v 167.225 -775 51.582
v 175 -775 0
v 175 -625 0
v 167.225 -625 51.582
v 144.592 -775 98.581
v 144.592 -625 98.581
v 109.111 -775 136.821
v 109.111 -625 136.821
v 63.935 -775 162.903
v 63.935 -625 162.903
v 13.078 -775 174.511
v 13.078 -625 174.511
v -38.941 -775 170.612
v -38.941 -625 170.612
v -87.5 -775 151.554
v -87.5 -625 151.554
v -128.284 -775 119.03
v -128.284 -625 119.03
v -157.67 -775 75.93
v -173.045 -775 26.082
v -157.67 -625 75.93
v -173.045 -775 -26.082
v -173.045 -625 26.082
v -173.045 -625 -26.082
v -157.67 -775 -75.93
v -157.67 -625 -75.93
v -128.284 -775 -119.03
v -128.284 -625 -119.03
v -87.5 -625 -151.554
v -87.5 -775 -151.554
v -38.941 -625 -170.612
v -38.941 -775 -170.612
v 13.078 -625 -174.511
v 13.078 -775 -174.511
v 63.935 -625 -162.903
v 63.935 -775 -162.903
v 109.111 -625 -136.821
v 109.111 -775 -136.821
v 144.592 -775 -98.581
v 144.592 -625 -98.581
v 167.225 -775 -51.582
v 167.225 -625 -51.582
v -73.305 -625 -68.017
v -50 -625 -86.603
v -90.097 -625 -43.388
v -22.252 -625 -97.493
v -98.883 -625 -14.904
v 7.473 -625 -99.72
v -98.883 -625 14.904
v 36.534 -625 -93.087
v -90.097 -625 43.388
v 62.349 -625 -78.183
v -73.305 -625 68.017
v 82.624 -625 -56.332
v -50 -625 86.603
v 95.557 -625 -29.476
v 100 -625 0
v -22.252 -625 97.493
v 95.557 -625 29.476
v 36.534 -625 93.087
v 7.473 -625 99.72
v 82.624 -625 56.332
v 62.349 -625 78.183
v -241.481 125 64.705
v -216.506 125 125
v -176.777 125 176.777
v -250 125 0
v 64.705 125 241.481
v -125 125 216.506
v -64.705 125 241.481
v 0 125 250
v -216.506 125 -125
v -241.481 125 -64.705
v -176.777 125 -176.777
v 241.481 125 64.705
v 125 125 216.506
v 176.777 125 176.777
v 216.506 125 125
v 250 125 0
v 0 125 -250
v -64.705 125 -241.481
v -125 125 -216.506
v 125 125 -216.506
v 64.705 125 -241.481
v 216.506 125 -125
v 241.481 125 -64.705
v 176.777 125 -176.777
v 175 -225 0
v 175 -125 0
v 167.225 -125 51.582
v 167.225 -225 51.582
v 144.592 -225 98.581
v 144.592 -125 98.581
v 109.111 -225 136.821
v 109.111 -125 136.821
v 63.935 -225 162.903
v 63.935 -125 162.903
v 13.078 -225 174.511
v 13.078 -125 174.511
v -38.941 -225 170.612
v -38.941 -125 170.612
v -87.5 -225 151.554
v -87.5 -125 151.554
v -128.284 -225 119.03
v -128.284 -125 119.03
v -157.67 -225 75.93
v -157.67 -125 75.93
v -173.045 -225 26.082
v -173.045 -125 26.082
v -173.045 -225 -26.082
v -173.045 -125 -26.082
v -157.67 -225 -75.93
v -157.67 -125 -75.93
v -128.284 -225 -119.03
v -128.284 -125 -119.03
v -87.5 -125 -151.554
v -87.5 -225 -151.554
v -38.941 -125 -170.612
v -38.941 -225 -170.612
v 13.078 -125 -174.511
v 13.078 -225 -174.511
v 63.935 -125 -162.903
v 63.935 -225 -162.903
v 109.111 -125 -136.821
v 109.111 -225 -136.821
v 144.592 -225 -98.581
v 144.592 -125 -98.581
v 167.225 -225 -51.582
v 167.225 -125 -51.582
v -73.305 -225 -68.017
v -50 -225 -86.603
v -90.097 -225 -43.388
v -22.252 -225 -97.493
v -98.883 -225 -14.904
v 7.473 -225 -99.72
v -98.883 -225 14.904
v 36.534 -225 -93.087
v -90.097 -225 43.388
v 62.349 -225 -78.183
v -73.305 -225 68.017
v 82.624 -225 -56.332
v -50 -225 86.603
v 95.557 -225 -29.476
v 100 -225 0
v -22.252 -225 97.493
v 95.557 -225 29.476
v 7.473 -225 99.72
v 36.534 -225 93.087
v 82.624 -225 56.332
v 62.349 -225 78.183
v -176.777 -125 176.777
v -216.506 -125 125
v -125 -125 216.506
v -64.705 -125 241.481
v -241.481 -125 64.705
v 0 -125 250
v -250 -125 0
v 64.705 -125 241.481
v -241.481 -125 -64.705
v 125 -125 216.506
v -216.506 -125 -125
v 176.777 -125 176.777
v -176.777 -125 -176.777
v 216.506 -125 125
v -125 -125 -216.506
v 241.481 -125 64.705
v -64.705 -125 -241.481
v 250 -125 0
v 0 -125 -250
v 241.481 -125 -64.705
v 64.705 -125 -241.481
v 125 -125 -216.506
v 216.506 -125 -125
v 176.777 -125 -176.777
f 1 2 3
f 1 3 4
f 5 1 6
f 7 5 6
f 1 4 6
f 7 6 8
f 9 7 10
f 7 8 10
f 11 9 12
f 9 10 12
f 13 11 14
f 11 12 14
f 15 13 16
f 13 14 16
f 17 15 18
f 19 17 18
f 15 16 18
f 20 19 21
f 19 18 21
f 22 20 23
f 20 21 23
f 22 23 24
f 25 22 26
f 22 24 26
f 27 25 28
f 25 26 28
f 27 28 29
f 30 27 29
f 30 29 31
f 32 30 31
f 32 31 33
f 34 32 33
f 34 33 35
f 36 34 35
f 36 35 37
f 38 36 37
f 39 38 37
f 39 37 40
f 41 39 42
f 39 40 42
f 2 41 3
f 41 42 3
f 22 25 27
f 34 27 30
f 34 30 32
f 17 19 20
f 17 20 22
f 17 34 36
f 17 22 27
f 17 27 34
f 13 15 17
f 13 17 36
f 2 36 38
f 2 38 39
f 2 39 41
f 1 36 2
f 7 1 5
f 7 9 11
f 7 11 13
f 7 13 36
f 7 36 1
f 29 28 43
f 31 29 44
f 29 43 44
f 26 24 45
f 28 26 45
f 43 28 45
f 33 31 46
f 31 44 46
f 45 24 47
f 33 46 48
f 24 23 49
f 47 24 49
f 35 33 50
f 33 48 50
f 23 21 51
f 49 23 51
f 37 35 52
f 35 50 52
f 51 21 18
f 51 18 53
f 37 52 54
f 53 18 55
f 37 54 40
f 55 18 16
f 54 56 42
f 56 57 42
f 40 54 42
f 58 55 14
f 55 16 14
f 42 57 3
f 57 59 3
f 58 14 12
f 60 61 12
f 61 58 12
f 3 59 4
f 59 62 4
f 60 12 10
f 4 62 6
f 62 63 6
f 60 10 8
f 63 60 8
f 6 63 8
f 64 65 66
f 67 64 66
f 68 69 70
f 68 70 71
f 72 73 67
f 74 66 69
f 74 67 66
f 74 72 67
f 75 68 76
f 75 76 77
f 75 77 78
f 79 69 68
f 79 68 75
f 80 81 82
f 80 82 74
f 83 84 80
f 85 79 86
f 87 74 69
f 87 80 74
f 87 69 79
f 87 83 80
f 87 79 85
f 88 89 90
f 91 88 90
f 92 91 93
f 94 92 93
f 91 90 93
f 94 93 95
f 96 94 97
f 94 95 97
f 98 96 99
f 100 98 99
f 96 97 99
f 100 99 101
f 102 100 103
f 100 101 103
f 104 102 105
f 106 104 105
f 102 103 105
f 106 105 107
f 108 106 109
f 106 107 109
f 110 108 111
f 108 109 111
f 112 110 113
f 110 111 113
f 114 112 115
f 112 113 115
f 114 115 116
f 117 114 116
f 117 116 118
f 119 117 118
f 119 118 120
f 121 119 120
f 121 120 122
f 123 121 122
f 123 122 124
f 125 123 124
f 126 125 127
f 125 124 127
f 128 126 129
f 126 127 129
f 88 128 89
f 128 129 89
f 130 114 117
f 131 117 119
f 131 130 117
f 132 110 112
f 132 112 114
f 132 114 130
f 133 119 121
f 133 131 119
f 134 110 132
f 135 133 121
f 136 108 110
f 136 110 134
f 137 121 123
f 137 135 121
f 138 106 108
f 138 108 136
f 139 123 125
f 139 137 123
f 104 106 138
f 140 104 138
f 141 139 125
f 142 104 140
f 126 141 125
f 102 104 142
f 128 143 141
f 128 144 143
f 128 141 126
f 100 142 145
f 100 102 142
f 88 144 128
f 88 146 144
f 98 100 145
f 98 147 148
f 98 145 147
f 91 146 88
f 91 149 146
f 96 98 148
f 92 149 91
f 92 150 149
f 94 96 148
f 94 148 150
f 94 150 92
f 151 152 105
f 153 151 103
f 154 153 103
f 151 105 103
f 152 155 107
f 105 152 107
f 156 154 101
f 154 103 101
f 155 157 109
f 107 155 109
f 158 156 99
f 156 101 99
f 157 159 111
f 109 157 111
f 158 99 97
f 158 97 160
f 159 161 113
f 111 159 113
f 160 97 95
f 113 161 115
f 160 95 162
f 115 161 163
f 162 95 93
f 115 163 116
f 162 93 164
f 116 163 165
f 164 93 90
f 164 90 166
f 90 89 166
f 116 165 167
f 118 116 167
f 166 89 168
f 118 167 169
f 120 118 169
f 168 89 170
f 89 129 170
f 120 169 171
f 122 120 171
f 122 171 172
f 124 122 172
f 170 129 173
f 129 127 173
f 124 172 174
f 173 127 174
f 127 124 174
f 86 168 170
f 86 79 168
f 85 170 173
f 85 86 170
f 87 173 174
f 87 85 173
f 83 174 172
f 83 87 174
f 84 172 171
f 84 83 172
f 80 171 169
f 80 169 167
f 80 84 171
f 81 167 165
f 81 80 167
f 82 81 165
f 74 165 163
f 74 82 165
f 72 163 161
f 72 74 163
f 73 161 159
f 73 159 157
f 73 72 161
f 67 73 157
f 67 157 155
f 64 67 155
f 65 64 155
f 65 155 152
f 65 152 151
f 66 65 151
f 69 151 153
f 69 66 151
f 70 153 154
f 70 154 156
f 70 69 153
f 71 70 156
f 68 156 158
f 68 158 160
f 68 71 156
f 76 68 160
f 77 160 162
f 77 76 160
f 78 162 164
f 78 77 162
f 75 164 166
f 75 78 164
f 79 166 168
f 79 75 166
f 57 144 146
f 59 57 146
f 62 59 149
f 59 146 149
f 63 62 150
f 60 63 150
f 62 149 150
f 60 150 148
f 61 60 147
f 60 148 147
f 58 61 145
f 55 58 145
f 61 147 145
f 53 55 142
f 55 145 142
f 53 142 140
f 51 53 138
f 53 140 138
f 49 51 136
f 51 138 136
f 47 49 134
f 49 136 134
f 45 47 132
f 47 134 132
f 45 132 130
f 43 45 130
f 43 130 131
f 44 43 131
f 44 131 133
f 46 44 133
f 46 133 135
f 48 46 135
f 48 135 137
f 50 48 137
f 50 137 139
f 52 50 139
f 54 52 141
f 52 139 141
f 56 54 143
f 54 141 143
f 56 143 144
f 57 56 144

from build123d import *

# Parameters (mm, degrees)
SKETCH1_R           = 250
BOSS_EXTRUDE1_DEPTH = 125
SKETCH2_R           = 175
BOSS_EXTRUDE2_DEPTH = 100
SKETCH3_R           = 100
BOSS_EXTRUDE3_DEPTH = 400
SKETCH4_R           = 175
BOSS_EXTRUDE4_DEPTH = 150


with BuildPart() as part:
    # Sketch1 → Boss-Extrude1 (new body, symmetric)
    with BuildSketch(Plane(origin=(0, 0, 0), x_dir=(1, 0, 0), z_dir=(0, 1, 0))):
        Circle(SKETCH1_R)
    extrude(amount=BOSS_EXTRUDE1_DEPTH, both=True)

    # Sketch2 → Boss-Extrude2 (add)
    with BuildSketch(Plane.XZ.offset(125)):
        Circle(SKETCH2_R)
    extrude(amount=BOSS_EXTRUDE2_DEPTH)

    # Sketch3 → Boss-Extrude3 (add)
    with BuildSketch(Plane.XZ.offset(225)):
        Circle(SKETCH3_R)
    extrude(amount=BOSS_EXTRUDE3_DEPTH)

    # Sketch4 → Boss-Extrude4 (add)
    with BuildSketch(Plane.XZ.offset(625)):
        Circle(SKETCH4_R)
    extrude(amount=BOSS_EXTRUDE4_DEPTH)


solid = part.part
